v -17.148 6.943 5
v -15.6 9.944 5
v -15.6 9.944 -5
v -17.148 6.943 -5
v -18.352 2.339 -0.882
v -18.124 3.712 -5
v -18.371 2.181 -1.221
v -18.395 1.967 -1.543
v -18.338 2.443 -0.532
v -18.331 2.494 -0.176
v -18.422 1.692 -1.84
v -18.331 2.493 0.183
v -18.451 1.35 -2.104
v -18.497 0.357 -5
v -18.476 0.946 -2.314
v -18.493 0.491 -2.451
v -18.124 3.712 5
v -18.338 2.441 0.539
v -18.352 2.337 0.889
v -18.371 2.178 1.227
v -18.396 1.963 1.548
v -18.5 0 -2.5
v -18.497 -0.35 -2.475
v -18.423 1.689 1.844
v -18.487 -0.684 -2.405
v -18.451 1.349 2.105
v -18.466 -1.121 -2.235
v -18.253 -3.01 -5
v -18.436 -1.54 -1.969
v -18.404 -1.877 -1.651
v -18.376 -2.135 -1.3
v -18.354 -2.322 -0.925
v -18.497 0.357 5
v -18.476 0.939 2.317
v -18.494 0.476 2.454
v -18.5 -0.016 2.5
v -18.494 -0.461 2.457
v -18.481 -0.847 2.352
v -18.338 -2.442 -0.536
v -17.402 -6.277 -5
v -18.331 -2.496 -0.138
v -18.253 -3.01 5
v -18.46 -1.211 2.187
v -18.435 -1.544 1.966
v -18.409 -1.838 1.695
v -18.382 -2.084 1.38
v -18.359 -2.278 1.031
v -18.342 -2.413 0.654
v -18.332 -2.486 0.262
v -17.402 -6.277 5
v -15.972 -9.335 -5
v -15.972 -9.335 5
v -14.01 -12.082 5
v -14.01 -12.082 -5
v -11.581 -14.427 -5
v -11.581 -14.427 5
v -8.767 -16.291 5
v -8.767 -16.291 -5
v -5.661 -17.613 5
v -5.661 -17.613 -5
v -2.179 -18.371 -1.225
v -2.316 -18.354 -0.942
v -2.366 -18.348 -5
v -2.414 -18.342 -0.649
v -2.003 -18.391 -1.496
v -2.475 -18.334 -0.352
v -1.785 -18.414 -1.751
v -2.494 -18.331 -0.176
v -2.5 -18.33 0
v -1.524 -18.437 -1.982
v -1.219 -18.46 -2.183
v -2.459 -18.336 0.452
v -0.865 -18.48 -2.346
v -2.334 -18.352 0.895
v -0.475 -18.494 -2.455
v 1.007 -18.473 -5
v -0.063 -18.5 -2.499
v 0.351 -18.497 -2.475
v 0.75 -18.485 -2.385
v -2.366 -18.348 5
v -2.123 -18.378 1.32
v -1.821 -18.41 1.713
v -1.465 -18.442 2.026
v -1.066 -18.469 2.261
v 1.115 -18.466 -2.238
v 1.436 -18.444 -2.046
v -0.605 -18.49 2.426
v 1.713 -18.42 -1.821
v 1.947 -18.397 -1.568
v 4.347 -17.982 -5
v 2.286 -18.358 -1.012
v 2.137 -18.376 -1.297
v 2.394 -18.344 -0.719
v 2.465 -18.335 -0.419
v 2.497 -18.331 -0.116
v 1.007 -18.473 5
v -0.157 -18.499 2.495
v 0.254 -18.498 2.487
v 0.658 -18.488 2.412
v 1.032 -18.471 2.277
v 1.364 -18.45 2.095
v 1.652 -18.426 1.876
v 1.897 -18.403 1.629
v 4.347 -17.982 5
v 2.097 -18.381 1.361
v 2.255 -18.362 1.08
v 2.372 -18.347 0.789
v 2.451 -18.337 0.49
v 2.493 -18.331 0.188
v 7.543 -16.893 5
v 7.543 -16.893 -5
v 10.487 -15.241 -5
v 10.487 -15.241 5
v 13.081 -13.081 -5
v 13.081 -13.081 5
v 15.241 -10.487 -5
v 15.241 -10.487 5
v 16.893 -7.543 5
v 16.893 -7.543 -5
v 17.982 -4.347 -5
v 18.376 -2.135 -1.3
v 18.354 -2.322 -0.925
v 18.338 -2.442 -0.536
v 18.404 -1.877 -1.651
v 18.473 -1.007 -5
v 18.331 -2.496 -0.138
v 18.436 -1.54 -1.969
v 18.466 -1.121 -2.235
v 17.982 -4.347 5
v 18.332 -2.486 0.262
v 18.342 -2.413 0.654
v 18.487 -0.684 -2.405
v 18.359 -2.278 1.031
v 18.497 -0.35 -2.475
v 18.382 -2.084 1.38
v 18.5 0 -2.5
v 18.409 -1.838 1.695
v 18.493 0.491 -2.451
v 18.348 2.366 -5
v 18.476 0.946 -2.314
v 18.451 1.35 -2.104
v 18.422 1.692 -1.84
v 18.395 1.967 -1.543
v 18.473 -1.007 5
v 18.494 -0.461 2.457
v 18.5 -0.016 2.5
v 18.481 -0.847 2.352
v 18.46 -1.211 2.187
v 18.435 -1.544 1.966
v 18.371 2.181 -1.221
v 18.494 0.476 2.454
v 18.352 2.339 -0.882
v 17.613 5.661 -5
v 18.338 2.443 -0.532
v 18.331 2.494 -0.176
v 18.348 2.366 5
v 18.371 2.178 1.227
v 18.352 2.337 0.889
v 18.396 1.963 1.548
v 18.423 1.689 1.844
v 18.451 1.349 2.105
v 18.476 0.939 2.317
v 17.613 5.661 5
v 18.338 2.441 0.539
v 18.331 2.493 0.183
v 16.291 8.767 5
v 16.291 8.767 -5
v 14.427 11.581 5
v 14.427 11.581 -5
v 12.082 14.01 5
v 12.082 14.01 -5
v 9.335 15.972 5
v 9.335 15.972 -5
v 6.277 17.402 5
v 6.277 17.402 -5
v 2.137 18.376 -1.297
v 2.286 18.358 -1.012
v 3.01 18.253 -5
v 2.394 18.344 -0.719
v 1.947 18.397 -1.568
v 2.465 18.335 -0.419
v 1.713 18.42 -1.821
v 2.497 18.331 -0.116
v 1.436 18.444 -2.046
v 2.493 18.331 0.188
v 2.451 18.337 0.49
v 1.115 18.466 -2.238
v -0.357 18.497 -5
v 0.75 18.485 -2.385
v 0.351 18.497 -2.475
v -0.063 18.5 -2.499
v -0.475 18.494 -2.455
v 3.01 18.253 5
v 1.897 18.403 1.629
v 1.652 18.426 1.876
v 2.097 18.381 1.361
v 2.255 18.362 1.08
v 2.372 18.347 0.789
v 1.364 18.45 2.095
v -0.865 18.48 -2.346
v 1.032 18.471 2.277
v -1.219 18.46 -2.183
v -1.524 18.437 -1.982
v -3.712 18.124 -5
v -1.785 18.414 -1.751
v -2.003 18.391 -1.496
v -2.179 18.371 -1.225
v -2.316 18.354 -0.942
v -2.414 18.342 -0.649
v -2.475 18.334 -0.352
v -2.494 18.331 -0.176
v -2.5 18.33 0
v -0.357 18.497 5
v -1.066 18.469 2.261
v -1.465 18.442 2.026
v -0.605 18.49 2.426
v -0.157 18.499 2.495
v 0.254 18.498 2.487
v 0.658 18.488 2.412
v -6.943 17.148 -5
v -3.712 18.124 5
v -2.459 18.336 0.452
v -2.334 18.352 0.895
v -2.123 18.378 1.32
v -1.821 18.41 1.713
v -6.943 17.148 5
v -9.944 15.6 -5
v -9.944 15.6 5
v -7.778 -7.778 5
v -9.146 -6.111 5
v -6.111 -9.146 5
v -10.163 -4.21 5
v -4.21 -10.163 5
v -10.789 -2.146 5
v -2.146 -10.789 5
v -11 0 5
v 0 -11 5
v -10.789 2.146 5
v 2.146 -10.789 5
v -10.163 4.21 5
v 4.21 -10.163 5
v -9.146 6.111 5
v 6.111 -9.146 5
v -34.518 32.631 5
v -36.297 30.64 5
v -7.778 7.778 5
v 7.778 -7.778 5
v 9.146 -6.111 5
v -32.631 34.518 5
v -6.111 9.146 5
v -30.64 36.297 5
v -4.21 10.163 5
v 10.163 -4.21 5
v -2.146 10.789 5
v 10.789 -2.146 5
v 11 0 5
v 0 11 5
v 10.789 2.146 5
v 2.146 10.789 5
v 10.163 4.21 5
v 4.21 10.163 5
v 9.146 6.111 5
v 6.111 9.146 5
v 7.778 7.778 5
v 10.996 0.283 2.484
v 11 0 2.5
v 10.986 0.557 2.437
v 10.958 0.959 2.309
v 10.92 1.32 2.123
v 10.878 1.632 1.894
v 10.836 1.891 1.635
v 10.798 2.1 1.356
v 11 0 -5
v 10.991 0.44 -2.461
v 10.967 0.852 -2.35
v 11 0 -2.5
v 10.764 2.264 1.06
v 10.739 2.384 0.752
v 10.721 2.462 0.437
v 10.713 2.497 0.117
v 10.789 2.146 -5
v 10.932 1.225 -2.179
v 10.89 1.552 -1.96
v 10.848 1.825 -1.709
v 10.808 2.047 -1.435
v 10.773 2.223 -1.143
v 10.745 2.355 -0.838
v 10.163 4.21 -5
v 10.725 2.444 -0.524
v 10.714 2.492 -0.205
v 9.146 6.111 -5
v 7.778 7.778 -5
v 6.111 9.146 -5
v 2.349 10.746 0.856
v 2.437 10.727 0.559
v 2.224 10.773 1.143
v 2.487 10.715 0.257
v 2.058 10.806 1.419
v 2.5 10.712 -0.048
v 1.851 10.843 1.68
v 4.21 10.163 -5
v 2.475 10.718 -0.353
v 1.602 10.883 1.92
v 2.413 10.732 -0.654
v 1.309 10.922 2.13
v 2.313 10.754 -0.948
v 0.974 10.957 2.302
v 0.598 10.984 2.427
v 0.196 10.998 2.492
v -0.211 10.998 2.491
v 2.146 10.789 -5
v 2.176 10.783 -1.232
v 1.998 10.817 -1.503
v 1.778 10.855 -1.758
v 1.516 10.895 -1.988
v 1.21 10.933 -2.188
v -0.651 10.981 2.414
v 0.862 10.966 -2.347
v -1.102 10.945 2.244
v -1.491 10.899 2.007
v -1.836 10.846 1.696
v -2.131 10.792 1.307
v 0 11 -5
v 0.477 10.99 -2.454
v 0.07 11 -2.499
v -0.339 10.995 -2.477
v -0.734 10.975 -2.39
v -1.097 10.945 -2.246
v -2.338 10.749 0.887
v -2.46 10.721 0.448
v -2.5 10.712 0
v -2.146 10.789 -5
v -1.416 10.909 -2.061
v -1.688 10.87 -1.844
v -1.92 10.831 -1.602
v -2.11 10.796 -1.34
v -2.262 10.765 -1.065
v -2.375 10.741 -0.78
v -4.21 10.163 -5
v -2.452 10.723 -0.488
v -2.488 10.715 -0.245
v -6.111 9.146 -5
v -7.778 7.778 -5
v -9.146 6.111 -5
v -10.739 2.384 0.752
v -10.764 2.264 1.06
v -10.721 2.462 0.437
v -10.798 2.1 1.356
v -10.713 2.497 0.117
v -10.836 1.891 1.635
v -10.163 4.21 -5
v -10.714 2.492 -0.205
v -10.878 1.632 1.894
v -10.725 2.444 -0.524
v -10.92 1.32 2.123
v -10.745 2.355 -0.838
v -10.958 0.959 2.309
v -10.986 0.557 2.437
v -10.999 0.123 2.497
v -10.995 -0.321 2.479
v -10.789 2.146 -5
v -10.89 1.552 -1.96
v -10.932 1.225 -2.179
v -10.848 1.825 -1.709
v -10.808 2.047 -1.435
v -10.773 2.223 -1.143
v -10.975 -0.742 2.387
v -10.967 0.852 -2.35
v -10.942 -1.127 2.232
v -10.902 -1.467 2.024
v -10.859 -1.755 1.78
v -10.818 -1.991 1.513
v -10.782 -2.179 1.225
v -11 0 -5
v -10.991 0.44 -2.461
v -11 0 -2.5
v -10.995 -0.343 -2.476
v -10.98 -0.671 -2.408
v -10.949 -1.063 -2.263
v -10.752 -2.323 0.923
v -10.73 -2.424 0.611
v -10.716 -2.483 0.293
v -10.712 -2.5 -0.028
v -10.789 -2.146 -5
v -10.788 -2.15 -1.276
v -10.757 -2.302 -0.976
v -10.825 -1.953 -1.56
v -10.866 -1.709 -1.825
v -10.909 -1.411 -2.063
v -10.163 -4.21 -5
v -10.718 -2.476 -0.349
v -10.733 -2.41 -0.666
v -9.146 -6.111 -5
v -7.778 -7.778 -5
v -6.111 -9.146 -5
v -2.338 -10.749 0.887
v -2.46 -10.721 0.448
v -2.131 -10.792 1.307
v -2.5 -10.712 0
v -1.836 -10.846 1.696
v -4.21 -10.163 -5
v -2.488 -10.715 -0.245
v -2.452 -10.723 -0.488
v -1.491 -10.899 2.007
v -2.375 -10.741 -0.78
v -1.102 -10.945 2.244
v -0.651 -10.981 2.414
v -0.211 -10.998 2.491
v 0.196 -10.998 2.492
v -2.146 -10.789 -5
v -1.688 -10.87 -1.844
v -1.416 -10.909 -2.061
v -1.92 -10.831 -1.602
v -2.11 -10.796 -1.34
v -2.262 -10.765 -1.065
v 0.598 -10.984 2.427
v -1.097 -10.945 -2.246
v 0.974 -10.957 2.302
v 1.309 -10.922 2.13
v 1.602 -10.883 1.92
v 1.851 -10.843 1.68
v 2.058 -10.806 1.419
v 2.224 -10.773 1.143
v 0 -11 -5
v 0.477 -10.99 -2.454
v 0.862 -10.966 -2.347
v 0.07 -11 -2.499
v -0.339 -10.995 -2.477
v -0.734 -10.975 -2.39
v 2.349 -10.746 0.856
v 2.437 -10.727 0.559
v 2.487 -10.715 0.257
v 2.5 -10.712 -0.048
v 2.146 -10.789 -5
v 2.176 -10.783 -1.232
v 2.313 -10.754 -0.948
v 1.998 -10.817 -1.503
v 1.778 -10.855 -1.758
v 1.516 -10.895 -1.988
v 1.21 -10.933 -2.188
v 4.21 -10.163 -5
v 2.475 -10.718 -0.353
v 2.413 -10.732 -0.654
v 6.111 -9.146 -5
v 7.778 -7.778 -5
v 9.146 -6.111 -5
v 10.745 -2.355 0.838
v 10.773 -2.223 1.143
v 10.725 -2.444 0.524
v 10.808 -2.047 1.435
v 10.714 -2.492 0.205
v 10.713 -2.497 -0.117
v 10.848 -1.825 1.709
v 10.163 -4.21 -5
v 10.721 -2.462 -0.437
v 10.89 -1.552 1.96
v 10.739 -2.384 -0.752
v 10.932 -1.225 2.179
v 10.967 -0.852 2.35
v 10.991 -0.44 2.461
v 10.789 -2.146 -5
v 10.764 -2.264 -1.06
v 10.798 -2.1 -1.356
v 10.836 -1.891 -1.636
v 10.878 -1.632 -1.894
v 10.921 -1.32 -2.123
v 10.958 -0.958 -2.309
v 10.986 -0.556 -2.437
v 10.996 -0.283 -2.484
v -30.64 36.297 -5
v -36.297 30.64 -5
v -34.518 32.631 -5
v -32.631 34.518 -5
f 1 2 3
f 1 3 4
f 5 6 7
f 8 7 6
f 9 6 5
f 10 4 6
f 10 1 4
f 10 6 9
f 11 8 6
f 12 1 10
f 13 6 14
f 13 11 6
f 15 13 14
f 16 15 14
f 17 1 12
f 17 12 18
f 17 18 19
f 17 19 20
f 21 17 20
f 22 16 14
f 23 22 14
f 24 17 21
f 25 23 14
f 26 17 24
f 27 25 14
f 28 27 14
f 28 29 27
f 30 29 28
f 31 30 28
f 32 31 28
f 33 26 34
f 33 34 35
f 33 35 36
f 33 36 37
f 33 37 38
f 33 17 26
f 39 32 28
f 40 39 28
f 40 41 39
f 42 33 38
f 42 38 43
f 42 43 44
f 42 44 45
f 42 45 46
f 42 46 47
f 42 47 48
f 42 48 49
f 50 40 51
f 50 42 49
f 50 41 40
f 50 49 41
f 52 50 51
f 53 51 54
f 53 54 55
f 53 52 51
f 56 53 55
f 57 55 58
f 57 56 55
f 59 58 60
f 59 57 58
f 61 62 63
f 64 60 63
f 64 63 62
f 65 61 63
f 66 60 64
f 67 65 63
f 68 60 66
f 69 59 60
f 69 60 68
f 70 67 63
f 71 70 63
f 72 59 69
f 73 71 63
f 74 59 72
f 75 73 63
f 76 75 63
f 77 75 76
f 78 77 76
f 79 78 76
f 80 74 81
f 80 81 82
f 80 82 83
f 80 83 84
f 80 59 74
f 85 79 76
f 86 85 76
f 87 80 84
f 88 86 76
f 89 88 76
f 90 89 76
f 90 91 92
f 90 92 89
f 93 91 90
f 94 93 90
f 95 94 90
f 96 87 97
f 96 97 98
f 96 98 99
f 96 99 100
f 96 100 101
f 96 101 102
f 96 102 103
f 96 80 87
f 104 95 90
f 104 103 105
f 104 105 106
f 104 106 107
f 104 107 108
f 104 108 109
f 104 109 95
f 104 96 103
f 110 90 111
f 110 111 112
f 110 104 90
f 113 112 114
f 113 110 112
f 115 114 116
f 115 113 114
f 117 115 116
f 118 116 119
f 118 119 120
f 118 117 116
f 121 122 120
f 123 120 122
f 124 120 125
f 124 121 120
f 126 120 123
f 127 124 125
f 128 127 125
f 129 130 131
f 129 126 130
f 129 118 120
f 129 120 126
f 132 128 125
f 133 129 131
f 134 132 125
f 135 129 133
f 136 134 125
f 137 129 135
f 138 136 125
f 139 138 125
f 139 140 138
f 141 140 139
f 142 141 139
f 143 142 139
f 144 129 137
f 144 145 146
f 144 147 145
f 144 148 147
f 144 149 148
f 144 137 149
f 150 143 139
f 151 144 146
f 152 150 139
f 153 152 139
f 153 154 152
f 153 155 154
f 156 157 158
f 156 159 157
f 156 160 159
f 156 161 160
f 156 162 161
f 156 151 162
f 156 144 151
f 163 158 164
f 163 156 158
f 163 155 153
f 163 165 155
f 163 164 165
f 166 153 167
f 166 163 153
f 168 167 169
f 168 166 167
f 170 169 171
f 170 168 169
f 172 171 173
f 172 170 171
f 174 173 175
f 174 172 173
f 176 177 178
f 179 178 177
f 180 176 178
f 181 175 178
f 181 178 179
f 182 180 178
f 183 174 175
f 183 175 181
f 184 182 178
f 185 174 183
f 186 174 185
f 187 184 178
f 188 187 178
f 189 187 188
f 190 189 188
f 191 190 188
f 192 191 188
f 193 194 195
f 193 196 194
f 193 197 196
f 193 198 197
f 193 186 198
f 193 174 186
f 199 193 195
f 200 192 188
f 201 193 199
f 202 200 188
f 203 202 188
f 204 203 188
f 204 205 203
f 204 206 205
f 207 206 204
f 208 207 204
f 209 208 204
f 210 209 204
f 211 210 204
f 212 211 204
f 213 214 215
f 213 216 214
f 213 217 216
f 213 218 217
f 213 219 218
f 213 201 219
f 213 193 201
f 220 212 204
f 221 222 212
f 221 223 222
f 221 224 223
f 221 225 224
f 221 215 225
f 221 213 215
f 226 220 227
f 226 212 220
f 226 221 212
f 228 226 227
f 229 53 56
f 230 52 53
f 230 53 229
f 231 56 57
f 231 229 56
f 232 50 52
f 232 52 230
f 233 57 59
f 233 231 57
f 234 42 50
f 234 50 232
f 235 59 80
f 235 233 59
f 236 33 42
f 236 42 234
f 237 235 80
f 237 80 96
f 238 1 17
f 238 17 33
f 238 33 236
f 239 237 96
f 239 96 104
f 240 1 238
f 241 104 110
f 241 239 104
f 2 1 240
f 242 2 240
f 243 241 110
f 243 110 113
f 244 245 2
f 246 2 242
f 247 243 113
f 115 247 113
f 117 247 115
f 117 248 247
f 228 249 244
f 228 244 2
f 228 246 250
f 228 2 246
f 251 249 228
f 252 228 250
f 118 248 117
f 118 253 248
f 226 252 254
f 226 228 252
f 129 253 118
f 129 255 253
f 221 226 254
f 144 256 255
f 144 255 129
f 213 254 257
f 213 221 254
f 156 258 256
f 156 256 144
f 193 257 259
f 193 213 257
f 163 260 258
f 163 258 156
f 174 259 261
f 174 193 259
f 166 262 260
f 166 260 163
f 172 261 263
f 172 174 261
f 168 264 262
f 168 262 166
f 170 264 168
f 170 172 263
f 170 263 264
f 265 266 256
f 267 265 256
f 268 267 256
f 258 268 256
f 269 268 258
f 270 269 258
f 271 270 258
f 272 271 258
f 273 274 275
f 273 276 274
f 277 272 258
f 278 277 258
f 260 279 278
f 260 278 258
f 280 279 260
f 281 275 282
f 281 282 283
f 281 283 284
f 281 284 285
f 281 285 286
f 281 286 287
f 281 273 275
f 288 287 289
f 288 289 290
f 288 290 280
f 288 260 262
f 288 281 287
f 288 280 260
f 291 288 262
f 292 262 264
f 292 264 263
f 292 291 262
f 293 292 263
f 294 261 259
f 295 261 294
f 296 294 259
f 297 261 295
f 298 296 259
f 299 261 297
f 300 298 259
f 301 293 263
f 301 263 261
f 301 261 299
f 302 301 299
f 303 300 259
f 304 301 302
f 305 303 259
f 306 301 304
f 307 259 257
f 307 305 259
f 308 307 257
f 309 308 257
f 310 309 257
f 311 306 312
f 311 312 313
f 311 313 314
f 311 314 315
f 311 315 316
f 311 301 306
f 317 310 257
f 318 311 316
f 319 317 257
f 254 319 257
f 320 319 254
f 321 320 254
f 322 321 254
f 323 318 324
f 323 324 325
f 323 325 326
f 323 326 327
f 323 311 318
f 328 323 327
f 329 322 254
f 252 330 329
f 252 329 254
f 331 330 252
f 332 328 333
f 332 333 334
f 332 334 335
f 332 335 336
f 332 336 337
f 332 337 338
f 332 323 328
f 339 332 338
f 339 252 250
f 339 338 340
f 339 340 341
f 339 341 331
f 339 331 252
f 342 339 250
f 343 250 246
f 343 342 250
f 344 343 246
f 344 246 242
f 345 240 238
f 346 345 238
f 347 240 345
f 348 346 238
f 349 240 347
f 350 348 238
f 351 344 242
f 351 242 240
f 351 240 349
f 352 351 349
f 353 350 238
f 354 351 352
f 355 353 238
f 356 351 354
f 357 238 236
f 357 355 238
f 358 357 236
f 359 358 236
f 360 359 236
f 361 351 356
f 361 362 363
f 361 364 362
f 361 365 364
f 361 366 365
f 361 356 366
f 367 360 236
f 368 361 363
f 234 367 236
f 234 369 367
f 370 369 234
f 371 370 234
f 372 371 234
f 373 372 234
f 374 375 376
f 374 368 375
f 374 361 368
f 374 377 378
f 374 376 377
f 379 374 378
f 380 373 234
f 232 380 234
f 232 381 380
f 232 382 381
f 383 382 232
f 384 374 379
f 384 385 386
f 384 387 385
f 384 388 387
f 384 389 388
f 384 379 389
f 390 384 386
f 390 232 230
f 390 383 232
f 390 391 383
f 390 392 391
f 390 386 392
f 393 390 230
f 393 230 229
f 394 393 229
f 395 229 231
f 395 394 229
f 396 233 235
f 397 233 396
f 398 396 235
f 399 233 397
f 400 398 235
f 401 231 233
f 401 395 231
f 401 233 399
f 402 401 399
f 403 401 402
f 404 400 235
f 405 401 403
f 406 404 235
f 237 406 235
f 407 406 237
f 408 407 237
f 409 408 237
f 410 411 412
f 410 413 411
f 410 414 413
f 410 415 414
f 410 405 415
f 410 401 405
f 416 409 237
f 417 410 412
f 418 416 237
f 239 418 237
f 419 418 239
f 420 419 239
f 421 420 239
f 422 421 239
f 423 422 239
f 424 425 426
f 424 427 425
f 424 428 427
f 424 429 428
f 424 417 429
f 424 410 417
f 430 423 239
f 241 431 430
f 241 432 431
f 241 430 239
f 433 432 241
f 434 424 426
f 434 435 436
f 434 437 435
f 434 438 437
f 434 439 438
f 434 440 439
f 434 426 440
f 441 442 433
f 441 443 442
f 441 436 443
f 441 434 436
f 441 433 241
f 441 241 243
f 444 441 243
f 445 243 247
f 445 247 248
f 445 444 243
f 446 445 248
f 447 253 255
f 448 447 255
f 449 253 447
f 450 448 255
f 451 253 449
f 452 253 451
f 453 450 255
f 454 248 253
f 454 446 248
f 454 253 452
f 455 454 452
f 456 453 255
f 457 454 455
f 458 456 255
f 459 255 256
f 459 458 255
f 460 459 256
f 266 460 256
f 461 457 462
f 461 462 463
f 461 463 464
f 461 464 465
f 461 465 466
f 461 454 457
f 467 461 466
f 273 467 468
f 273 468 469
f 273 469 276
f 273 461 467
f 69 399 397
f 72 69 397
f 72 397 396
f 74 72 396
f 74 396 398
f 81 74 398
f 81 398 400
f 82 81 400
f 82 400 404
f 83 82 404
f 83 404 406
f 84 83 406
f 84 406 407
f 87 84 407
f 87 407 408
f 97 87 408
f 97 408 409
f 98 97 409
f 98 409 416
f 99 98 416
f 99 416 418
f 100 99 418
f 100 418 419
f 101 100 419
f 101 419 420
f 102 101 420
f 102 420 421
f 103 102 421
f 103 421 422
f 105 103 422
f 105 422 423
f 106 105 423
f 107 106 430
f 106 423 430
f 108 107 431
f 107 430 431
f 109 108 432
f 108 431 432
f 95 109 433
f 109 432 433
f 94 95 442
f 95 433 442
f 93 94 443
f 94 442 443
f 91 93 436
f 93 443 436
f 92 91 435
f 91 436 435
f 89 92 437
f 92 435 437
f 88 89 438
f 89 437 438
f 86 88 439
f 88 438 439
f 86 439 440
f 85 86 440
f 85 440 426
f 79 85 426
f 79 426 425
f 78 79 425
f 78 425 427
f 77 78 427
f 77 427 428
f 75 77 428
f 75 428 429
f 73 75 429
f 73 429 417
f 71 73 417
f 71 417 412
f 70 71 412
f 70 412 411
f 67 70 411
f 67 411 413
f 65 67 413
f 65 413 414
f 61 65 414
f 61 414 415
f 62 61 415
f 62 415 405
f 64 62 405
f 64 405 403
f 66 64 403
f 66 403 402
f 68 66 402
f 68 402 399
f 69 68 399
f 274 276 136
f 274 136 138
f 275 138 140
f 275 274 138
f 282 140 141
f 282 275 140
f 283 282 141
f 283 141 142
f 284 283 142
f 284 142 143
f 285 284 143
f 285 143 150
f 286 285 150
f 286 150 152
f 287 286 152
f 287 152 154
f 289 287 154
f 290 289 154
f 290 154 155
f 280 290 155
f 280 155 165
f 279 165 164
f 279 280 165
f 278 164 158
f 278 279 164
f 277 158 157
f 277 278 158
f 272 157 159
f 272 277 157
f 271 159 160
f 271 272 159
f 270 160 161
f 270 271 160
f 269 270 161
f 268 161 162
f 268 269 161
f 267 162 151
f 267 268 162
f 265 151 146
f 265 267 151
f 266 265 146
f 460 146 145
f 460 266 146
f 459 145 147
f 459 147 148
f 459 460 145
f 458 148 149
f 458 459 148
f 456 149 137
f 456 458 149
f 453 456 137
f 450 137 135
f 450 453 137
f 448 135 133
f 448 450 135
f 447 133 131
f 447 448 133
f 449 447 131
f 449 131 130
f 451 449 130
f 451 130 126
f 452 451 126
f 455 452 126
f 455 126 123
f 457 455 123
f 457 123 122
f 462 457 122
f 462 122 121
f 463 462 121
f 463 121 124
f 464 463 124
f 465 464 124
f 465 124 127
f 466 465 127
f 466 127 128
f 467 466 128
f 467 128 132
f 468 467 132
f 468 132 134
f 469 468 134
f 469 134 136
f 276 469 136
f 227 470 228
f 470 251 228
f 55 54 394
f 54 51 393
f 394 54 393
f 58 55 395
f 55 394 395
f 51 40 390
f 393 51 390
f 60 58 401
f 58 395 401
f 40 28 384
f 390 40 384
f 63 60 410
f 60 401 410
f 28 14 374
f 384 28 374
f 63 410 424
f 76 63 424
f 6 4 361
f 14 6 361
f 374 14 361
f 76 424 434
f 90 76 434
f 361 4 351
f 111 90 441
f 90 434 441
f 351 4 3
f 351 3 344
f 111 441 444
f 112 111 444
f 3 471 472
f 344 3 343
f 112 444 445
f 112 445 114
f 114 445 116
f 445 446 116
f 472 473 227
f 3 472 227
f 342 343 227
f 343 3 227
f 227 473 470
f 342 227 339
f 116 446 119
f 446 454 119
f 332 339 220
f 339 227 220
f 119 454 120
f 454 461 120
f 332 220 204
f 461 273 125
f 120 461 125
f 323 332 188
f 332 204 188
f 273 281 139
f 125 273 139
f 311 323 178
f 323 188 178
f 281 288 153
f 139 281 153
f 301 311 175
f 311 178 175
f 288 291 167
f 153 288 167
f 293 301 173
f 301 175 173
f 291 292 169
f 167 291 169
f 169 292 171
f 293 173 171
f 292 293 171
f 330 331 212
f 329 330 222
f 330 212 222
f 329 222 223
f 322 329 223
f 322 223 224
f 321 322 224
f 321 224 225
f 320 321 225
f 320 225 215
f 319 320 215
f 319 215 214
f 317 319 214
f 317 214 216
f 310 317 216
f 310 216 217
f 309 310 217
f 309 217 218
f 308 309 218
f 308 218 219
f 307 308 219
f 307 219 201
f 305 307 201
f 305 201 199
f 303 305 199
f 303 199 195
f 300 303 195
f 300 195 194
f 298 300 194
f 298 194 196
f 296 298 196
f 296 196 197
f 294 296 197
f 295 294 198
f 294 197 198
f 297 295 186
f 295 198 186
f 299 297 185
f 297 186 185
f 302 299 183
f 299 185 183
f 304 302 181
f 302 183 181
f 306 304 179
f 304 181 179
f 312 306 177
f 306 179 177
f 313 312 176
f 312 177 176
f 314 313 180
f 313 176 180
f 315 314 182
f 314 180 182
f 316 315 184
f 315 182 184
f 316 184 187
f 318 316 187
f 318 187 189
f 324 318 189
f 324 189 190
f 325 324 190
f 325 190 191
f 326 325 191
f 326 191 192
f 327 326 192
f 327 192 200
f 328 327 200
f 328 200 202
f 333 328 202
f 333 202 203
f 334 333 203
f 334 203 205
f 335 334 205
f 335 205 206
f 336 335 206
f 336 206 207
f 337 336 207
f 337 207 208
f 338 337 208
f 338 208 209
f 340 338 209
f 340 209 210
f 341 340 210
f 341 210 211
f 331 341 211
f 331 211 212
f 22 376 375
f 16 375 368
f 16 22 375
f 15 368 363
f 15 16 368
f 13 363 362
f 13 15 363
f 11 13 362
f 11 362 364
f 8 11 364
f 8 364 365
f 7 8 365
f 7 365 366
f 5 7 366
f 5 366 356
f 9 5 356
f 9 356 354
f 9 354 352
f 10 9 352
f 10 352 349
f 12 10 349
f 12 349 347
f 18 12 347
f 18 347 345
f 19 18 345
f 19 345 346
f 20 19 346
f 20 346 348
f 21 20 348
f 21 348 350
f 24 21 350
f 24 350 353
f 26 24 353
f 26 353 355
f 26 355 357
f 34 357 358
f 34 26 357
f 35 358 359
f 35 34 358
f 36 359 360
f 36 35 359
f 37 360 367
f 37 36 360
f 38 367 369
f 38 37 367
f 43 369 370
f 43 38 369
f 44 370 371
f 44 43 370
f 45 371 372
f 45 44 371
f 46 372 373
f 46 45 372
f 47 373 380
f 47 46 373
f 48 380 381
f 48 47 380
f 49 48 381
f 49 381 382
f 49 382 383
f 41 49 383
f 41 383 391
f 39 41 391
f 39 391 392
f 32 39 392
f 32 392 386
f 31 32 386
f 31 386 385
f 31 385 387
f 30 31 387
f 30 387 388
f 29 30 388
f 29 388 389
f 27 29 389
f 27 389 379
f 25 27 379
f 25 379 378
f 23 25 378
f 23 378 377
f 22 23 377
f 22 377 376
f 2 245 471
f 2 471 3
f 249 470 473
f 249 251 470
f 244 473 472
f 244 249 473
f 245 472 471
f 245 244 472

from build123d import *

# Parameters (mm, degrees)
SKETCH019_R          = 11
PAD015_DEPTH         = 5
SKETCH020_R          = 2.5
POCKET012_DEPTH      = 53.001
POCKET012_DEPTH_BACK = 1.797696
SKETCH021_R          = 2.5
POCKET013_DEPTH      = 1.297696
POCKET013_DEPTH_BACK = 53.501


with BuildPart() as part:
    # Sketch019 → Pad015 (new body, symmetric)
    with BuildSketch(Plane.XY):
        with BuildLine():
            ThreePointArc((-30.639841, 36.296696), (-33.587572, 33.587572), (-36.296696, 30.639841))
            Line((-36.296696, 30.639841), (-15.600467, 9.943613))
            ThreePointArc((-15.600467, 9.943613), (13.081475, -13.081475), (-9.943613, 15.600467))
            Line((-30.639841, 36.296696), (-9.943613, 15.600467))
        make_face()
        Circle(SKETCH019_R, mode=Mode.SUBTRACT)
    extrude(amount=PAD015_DEPTH, both=True)

    # Sketch020 → Pocket012 (cut, two sides)
    with BuildSketch(Plane(origin=(0, 34.5, 0), x_dir=(-1, 0, 0), z_dir=(0, 1, 0))) as pocket012_sk:
        Circle(SKETCH020_R)
    extrude(amount=-POCKET012_DEPTH, mode=Mode.SUBTRACT)
    extrude(pocket012_sk.sketch, amount=POCKET012_DEPTH_BACK, mode=Mode.SUBTRACT)

    # Sketch021 → Pocket013 (cut, two sides)
    with BuildSketch(Plane(origin=(-35, 0, 0), x_dir=(0, 0, -1), z_dir=(1, 0, 0))) as pocket013_sk:
        Circle(SKETCH021_R)
    extrude(amount=-POCKET013_DEPTH, mode=Mode.SUBTRACT)
    extrude(pocket013_sk.sketch, amount=POCKET013_DEPTH_BACK, mode=Mode.SUBTRACT)


solid = part.part
